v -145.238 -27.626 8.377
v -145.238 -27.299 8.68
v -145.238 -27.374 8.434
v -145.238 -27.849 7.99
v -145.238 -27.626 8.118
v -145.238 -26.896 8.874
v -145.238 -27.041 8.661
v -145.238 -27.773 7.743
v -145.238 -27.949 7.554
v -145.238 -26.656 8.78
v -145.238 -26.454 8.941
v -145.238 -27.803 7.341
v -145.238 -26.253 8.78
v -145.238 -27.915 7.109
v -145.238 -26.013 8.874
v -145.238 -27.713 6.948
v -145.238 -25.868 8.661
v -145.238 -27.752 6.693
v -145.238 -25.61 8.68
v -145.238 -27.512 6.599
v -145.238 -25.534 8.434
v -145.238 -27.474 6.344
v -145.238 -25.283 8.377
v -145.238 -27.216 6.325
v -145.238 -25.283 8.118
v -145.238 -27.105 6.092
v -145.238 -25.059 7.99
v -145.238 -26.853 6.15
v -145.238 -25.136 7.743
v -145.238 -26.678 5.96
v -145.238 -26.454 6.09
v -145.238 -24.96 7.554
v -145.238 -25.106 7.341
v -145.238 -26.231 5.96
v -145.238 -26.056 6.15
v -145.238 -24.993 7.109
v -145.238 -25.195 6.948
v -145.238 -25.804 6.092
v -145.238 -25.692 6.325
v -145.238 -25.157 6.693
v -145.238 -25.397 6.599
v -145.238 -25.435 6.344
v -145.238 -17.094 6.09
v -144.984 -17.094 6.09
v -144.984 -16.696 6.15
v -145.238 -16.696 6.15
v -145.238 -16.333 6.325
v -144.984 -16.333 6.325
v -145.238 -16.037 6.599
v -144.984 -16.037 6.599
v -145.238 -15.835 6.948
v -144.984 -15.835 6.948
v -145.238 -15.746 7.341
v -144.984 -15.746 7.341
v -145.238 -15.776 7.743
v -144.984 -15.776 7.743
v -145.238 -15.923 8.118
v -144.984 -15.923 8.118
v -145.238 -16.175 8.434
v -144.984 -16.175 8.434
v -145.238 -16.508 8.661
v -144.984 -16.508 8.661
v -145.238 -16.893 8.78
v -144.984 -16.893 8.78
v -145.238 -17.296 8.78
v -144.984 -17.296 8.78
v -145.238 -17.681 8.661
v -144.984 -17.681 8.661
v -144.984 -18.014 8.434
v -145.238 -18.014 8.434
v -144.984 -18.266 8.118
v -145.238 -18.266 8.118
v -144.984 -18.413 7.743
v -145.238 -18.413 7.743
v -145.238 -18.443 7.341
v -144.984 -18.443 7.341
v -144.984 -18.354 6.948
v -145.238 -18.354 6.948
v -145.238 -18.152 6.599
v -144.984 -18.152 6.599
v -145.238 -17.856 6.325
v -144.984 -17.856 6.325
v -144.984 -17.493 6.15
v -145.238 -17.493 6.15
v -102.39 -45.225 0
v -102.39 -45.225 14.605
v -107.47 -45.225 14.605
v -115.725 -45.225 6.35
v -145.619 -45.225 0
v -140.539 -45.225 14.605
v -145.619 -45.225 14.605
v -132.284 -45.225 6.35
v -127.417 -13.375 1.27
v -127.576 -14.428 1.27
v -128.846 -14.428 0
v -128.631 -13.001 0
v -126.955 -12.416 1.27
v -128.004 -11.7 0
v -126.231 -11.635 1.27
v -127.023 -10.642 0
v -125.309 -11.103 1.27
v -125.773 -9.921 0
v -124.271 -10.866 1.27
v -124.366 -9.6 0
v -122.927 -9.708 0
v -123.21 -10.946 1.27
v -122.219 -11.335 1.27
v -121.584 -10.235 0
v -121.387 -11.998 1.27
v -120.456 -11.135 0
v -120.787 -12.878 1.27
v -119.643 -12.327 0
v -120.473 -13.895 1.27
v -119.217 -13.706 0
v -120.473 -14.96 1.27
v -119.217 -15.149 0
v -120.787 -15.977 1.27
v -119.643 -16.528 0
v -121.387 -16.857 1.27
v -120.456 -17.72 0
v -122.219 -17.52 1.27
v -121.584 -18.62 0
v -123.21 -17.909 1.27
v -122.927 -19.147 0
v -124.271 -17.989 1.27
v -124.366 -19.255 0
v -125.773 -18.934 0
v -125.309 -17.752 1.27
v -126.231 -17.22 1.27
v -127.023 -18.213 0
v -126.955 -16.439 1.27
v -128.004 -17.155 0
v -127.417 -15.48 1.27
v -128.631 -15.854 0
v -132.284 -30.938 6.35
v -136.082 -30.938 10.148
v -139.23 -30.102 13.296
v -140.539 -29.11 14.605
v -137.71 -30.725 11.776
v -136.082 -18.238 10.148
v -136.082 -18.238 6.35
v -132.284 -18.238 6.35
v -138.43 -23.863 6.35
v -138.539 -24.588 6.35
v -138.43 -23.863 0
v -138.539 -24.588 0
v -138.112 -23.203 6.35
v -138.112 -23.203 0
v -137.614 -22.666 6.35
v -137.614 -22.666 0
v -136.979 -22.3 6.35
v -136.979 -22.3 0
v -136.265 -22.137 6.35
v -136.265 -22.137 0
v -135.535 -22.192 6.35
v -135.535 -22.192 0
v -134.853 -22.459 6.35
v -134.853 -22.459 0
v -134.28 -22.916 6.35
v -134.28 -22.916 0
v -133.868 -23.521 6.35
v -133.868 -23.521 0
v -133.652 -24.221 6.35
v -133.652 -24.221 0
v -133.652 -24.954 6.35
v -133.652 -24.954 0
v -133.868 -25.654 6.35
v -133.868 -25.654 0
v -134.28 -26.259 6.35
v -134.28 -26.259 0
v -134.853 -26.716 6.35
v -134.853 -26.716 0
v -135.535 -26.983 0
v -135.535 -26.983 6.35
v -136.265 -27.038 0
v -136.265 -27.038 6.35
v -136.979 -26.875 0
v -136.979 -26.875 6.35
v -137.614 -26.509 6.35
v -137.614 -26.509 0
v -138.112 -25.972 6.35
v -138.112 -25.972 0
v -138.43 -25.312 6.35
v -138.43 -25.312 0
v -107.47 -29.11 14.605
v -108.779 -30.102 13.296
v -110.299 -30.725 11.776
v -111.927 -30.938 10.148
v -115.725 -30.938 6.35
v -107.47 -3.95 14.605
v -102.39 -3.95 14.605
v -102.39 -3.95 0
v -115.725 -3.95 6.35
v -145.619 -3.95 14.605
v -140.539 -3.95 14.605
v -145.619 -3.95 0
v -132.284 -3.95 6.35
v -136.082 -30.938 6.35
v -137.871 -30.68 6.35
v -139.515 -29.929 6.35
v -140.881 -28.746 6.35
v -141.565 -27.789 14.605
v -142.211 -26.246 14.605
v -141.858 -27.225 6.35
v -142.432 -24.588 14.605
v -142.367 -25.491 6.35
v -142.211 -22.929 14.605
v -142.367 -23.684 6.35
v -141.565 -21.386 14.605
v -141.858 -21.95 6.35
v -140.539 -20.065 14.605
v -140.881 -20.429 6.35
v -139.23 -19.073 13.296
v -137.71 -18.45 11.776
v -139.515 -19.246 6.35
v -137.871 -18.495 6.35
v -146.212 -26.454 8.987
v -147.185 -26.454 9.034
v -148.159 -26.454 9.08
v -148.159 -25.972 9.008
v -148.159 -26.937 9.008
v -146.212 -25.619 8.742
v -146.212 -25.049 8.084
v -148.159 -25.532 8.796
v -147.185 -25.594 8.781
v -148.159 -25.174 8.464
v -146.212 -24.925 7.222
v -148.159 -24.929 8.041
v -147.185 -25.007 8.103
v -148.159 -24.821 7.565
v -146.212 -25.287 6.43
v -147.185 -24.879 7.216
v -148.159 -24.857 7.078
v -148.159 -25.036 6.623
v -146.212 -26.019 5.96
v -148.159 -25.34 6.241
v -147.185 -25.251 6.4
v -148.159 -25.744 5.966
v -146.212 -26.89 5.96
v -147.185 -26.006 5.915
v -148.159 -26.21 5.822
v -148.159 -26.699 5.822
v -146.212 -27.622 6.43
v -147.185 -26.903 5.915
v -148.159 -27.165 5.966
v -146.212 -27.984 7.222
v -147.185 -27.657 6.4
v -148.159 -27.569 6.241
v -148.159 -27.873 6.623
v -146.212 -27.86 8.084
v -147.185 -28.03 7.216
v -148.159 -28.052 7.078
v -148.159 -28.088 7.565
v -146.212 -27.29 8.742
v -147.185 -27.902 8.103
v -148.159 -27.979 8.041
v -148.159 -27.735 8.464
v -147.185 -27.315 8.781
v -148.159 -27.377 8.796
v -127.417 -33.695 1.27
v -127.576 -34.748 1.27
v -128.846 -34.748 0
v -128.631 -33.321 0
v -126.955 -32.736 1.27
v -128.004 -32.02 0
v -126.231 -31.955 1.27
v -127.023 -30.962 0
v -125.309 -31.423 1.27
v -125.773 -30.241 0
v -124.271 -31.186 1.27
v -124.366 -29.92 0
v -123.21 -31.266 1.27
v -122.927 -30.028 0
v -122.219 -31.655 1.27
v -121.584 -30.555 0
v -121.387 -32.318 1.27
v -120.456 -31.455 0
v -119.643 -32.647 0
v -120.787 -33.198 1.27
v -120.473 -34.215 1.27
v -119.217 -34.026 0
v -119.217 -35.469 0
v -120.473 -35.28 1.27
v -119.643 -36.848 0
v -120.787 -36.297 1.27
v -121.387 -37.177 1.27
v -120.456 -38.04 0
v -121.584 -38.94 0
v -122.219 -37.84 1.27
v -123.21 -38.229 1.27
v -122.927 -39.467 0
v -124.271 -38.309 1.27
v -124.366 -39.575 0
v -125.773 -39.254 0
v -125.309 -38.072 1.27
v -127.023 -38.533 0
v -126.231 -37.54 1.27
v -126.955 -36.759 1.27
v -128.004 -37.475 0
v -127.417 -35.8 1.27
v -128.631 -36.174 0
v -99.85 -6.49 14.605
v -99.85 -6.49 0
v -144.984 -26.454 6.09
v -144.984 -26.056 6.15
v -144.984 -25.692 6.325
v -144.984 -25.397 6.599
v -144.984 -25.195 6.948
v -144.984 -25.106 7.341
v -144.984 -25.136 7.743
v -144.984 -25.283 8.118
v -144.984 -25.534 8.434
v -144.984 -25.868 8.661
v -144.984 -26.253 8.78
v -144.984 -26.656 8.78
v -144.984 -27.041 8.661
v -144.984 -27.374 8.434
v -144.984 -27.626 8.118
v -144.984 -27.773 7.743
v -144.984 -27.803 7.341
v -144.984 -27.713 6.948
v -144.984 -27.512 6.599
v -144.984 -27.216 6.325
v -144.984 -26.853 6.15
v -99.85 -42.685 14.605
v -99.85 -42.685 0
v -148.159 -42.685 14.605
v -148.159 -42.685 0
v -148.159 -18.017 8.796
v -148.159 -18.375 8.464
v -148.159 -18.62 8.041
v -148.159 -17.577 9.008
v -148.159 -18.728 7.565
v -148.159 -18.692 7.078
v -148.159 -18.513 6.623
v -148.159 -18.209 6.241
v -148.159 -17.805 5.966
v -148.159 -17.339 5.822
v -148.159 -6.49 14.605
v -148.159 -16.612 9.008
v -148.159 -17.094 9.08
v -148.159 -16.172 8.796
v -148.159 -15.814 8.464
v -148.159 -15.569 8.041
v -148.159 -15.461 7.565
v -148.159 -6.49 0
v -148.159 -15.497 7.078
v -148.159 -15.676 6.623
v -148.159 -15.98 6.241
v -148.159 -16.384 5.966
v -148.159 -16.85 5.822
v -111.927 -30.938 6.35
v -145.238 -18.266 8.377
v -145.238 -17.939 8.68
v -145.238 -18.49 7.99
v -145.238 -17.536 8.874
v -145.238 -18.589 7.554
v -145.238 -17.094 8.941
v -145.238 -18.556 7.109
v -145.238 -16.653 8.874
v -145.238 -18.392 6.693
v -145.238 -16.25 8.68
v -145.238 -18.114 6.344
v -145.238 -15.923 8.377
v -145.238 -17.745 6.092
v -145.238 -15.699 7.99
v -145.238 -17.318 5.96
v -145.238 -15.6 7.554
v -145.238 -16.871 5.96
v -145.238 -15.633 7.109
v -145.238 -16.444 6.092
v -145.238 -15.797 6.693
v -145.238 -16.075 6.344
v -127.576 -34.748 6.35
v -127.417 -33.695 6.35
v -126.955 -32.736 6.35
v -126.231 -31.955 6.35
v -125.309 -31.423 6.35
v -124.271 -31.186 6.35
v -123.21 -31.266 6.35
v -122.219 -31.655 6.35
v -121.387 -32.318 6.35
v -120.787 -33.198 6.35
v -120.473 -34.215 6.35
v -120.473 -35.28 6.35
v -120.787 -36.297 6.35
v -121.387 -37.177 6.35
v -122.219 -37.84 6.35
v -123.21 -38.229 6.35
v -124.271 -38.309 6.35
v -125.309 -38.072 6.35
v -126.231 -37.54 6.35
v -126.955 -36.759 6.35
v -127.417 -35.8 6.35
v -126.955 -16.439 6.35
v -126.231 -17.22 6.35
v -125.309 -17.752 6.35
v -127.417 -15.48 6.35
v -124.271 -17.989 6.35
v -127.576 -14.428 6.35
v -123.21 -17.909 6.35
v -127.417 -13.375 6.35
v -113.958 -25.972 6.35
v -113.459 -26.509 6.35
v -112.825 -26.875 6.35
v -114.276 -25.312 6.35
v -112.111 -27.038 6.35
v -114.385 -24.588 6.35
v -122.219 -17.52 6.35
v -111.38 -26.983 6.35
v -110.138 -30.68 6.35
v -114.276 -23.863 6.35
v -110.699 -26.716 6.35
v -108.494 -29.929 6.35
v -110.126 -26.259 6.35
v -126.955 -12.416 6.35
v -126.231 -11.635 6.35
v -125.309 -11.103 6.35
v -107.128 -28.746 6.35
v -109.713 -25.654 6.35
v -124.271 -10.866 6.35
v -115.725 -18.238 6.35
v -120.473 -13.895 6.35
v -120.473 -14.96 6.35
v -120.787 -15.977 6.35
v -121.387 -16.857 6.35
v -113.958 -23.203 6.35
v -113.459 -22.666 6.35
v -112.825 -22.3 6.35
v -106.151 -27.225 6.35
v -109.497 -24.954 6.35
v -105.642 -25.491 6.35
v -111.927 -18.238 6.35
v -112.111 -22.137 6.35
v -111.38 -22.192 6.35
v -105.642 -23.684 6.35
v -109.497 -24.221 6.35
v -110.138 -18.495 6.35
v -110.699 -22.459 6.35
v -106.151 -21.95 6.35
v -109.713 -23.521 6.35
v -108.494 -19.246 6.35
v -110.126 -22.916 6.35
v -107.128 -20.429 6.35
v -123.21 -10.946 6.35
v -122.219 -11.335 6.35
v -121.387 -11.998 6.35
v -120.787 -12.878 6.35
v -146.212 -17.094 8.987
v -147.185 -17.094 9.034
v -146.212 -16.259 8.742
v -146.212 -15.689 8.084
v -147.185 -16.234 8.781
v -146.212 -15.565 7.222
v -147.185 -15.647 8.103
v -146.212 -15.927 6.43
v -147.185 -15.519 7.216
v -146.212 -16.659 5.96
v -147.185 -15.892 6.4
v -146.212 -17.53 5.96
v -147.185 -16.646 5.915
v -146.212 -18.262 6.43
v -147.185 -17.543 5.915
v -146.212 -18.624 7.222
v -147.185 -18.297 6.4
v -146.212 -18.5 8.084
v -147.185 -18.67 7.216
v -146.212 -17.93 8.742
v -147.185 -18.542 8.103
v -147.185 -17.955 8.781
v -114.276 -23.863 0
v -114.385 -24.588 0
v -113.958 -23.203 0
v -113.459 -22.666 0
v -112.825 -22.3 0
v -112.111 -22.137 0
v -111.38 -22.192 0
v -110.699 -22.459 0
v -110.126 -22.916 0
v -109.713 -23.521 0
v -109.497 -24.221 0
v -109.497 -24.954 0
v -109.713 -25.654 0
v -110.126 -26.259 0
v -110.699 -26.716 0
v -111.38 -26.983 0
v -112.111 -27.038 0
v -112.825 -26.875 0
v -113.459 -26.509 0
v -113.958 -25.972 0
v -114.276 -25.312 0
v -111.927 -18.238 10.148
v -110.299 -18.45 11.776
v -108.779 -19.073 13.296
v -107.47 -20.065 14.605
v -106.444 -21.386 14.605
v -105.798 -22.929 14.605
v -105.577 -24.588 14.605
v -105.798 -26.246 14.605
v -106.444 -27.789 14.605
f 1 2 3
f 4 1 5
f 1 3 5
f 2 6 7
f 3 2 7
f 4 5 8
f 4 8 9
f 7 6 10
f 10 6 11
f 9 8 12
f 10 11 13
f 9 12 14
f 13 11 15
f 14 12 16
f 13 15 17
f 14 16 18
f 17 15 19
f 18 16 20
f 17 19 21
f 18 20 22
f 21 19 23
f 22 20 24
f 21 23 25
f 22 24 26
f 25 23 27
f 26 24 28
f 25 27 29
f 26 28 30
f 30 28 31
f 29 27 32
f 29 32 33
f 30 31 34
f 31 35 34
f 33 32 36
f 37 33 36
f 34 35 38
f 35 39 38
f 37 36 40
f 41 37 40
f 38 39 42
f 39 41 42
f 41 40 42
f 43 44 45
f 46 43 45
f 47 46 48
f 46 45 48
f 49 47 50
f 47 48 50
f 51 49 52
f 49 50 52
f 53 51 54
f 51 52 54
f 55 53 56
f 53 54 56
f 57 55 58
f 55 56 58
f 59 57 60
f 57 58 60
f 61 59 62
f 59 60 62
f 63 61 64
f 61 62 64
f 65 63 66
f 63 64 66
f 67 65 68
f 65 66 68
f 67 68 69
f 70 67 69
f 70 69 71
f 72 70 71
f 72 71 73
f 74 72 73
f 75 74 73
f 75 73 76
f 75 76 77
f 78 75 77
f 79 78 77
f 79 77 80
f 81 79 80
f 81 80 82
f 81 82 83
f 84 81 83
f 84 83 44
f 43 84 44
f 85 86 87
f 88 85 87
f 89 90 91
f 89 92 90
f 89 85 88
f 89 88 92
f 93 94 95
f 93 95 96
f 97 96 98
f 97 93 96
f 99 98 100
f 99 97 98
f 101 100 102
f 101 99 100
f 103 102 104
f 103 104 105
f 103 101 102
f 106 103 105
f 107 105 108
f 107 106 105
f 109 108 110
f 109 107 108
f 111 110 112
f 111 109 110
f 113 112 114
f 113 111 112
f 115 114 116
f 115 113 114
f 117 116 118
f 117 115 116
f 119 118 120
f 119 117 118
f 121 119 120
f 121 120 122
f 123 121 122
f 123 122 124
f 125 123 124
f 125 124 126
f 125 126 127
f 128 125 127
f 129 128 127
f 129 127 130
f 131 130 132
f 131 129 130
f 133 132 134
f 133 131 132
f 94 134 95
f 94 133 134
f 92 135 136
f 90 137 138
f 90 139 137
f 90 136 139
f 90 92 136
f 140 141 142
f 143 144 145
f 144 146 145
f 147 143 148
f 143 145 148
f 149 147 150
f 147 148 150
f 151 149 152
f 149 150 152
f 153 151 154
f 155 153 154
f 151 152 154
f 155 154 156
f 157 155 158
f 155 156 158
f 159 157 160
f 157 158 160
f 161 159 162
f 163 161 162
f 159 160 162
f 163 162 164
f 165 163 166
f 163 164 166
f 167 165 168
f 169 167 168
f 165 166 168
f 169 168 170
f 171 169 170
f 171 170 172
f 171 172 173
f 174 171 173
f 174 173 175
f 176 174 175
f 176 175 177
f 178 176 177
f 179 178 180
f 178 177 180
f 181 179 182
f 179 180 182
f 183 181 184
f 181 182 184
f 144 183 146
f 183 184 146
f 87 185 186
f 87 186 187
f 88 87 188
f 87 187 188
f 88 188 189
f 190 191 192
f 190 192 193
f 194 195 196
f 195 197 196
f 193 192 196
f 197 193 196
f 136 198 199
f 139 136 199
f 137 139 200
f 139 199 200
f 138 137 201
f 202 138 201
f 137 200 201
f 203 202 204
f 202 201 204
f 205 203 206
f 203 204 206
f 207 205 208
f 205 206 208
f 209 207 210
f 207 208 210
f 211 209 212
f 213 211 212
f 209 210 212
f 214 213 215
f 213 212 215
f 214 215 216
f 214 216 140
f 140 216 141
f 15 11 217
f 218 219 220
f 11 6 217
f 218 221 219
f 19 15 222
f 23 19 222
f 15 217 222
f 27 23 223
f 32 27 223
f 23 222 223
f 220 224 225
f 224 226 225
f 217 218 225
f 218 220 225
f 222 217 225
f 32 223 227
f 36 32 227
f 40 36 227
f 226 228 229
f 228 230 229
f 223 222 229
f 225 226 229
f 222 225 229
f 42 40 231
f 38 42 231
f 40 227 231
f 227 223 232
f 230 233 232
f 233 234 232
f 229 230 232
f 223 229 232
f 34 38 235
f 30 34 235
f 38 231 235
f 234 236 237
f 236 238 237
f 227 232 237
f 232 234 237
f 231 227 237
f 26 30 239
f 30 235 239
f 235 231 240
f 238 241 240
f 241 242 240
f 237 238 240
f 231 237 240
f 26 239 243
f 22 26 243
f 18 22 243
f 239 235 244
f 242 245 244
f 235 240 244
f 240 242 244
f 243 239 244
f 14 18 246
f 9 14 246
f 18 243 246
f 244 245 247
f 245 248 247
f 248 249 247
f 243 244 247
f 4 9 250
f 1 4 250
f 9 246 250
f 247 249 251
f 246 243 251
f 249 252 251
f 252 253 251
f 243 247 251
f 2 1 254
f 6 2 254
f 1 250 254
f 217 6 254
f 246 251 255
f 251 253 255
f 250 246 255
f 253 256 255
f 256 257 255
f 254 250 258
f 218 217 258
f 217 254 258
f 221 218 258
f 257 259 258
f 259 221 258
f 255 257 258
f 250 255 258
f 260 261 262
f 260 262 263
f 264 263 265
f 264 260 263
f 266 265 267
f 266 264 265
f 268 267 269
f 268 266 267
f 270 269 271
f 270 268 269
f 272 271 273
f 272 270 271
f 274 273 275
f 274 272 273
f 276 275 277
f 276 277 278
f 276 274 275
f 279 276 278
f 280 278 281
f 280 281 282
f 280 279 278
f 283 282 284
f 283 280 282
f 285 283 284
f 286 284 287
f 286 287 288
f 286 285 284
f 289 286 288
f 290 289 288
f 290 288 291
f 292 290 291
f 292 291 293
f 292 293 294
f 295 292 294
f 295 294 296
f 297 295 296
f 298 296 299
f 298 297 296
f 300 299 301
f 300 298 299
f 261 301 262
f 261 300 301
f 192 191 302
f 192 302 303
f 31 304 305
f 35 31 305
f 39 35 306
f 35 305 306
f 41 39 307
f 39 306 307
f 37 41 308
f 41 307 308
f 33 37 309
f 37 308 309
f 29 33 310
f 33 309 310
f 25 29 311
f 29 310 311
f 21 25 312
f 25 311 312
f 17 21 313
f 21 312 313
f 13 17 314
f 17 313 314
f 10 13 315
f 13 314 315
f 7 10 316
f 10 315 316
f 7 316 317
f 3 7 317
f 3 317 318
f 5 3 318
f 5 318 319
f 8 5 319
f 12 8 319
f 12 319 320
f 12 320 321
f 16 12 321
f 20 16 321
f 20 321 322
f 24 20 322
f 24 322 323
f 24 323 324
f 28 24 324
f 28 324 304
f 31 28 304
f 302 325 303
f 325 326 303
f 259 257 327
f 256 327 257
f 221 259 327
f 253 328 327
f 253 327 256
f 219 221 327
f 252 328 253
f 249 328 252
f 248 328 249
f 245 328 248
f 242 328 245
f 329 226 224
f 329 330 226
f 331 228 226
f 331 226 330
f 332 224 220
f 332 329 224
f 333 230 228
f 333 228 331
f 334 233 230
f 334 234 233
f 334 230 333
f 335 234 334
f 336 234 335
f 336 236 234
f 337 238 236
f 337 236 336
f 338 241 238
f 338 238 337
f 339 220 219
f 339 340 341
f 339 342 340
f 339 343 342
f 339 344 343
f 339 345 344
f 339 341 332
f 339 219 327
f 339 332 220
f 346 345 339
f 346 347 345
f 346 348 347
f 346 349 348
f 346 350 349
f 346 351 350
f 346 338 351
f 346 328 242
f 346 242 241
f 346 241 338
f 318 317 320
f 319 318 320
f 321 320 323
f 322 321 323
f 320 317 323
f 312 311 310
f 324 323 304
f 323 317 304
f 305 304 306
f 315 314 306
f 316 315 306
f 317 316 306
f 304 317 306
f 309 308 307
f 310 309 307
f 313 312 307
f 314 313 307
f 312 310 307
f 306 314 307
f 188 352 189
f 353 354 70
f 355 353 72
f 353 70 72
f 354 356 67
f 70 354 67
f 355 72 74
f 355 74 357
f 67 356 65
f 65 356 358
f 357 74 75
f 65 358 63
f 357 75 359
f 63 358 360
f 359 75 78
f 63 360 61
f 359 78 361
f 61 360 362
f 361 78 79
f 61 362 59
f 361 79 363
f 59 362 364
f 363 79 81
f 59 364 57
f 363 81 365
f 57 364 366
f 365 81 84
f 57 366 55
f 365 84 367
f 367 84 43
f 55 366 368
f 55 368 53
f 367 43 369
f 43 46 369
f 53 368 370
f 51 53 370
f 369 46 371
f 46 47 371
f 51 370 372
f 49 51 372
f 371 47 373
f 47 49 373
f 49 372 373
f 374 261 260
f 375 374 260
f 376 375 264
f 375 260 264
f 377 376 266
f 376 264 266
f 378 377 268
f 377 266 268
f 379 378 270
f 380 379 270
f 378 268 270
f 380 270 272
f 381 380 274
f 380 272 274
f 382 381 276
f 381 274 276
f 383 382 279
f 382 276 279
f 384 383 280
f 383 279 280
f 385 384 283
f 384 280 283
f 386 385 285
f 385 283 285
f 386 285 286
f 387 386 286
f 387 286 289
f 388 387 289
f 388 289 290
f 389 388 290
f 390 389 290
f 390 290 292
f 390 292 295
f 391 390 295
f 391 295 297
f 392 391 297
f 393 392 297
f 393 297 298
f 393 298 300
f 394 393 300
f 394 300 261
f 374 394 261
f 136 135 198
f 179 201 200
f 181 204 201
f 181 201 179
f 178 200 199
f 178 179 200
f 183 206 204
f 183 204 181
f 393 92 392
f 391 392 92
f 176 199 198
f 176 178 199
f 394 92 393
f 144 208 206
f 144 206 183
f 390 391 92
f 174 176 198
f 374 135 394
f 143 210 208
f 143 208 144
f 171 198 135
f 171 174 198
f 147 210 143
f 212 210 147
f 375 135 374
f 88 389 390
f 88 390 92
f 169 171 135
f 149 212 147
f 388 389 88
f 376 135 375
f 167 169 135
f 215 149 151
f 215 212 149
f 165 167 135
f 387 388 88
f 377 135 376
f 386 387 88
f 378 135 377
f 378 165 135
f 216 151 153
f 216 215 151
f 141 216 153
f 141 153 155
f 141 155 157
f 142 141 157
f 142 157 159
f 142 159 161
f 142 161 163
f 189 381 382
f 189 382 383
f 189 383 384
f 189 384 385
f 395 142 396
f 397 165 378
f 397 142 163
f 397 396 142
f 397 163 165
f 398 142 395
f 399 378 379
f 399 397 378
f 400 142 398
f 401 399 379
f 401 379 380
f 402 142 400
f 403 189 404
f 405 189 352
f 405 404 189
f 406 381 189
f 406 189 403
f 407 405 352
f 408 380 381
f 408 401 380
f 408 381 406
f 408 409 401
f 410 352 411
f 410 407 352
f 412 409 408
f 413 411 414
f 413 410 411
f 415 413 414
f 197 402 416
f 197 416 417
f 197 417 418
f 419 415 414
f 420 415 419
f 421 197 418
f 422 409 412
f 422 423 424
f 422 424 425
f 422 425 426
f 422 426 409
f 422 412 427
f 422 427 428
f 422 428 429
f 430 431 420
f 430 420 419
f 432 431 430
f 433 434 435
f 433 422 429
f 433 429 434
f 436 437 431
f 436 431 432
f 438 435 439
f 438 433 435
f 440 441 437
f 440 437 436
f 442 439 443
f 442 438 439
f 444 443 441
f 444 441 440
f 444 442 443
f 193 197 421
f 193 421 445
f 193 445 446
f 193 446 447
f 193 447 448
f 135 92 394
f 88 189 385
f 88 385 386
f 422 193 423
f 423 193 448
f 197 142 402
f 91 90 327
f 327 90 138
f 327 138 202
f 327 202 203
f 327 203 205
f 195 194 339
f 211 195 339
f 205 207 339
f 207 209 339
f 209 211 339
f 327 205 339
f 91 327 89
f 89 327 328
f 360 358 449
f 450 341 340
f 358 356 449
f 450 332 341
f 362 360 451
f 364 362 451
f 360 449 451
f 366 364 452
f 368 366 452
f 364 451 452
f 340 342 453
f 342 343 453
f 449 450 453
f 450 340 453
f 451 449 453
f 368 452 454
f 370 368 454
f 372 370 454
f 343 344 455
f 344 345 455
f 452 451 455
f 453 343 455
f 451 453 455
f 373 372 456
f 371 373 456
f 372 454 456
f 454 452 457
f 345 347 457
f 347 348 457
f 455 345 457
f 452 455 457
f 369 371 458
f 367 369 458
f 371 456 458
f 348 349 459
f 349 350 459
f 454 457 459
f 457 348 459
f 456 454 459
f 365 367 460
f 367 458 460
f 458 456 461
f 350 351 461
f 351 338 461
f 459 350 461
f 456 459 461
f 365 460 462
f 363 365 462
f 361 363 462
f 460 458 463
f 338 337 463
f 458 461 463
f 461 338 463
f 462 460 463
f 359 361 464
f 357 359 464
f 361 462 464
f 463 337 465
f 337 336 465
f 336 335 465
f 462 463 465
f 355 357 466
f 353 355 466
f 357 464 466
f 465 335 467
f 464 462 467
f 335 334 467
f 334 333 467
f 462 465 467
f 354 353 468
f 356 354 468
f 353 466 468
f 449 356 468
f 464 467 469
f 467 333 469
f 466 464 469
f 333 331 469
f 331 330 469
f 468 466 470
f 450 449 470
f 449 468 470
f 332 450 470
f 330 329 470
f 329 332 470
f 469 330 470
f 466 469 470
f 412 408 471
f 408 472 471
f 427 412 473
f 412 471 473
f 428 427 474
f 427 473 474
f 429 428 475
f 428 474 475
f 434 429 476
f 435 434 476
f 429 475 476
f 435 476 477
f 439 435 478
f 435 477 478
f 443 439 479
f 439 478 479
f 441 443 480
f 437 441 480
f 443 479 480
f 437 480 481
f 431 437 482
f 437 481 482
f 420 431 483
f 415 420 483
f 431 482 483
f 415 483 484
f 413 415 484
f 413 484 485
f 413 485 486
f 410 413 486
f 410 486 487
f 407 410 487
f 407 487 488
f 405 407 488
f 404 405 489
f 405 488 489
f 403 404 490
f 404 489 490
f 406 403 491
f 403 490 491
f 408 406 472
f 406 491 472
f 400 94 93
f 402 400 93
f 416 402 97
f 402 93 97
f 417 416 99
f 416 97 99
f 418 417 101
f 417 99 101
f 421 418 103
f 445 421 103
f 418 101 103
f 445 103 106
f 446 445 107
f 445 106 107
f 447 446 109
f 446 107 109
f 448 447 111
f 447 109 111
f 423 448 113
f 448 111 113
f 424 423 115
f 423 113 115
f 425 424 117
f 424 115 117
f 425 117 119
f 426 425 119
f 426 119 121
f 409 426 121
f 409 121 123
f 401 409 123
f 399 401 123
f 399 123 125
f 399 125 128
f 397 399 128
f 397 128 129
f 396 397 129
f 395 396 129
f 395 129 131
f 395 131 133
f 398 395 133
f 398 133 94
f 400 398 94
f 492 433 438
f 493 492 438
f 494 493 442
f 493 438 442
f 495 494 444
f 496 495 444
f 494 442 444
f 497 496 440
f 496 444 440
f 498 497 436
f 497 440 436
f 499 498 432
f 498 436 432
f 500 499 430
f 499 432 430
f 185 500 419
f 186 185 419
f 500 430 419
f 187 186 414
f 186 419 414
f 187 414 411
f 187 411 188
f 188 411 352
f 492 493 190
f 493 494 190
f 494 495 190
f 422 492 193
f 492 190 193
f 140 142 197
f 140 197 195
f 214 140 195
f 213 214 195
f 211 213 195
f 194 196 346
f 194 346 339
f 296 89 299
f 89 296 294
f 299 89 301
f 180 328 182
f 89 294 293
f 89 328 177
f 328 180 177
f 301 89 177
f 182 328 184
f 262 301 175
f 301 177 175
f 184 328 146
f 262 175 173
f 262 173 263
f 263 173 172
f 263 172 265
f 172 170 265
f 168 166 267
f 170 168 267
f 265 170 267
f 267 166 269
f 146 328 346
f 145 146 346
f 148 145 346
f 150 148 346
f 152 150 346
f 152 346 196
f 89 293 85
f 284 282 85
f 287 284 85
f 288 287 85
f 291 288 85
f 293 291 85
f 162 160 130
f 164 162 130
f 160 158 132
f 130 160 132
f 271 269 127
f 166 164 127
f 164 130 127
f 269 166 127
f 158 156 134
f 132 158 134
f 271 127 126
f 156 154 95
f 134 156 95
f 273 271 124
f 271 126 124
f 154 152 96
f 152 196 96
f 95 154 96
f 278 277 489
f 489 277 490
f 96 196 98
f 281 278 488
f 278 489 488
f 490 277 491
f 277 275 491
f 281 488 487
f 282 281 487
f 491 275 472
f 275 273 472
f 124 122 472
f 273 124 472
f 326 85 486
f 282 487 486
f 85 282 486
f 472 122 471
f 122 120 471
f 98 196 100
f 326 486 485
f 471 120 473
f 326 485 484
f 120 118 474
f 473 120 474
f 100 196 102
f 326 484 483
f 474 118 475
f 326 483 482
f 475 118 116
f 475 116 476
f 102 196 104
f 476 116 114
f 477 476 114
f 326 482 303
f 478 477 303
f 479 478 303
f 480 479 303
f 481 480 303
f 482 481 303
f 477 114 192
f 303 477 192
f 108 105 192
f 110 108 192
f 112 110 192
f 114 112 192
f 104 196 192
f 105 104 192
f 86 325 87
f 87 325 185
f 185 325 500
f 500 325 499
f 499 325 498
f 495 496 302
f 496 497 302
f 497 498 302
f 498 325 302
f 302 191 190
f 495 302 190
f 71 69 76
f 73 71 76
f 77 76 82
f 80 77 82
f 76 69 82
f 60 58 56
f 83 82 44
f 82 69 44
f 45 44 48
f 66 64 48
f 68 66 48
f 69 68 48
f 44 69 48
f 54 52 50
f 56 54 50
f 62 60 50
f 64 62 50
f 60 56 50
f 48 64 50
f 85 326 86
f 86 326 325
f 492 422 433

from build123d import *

# Parameters (mm, degrees)
SKETCH1_W                 = 48.308864232
SKETCH1_H                 = 41.275
BOSS_EXTRUDE1_DEPTH       = 6.35
F_8_CLEARANCE_HOLE1_D     = 4.9149
F_1_4_CLEARANCE_HOLE1_D   = 7.14248
SKETCH9_W                 = 6.35
SKETCH9_H                 = 41.275
EXTRUDE_THIN1_DEPTH       = 8.255
CHAMFER2_SIZE             = 9.525
CUT_EXTRUDE1_DEPTH        = 156.127382276
CHAMFER1_SIZE             = 2.54
HOLE1_AT_2_COUNT          = 2
HOLE1_AT_2_PITCH          = 9.3599
F_2_CLEARANCE_HOLE1_D     = 2.7051
F_2_CLEARANCE_HOLE1_DEPTH = 3.175
CHAMFER3_SIZE             = 1.27


with BuildPart() as part:
    # Sketch1 → Boss-Extrude1 (new body)
    with BuildSketch(Plane.XY):
        with Locations((-124.004465969, -24.5875)):
            Rectangle(SKETCH1_W, SKETCH1_H)
    extrude(amount=BOSS_EXTRUDE1_DEPTH)

    # #8 Clearance Hole1 (through all)
    with Locations(Plane.XY.offset(6.35)):
        with Locations((-111.927249911, -24.5875), (-136.081682027, -24.5875)):
            Hole(F_8_CLEARANCE_HOLE1_D / 2)

    # 1/4 Clearance Hole1 (through all)
    with Locations(Plane.XY.offset(6.35)):
        with Locations((-124.004465969, -14.4275), (-124.004465969, -34.7475)):
            Hole(F_1_4_CLEARANCE_HOLE1_D / 2)

    # Sketch9 → Extrude-Thin1 (add)
    with BuildSketch(Plane.XY.offset(6.35)):
        with Locations((-103.025033853, -24.5875)):
            Rectangle(SKETCH9_W, SKETCH9_H)
        with Locations((-144.983898085, -24.5875)):
            Rectangle(SKETCH9_W, SKETCH9_H)
    extrude(amount=EXTRUDE_THIN1_DEPTH)

    # Chamfer2
    # the kernel refuses this chamfer: 9.525 mm, written as the material it adds along each edge
    with BuildSketch(Plane(origin=(-106.200033853, -3.95, 6.35), x_dir=(0.0274958766105871, 0, 0.9996219169112966), z_dir=(0, -1, 0))) as chamfer2_piece_1_section:
        Polygon((CHAMFER2_SIZE * 0.999621916911, CHAMFER2_SIZE * 0.0274958766106), (-CHAMFER2_SIZE * 0.0274958766106, CHAMFER2_SIZE * 0.999621916911), (0, 0), align=None)
    chamfer2_piece_1 = extrude(amount=41.275, mode=Mode.PRIVATE)
    chamfer2_piece_1 = chamfer2_piece_1 - Plane(origin=(-111.927249911, -24.5875, 9.368765613), x_dir=(-1, 0, 0), z_dir=(0, 0, -1)) * Cylinder(2.45745, 121, mode=Mode.PRIVATE)
    chamfer2_piece_1 = split(chamfer2_piece_1, bisect_by=Plane(origin=(-109.341812124, -24.58749874, 14.605), z_dir=(0, 0, -1)), keep=Keep.TOP, mode=Mode.PRIVATE)
    add(chamfer2_piece_1)
    with BuildSketch(Plane(origin=(-141.808898085, -45.225, 6.35), x_dir=(0.9996219169112968, 0, -0.027495876610586386), z_dir=(0, 1, 0))) as chamfer2_piece_2_section:
        Polygon((CHAMFER2_SIZE * 0.999621916911, -CHAMFER2_SIZE * 0.0274958766106), (-CHAMFER2_SIZE * 0.0274958766106, -CHAMFER2_SIZE * 0.999621916911), (0, 0), align=None)
    chamfer2_piece_2 = extrude(amount=41.275, mode=Mode.PRIVATE)
    chamfer2_piece_2 = chamfer2_piece_2 - Plane(origin=(-136.081682027, -24.5875, 9.368765819), x_dir=(-1, 0, 0), z_dir=(0, 0, -1)) * Cylinder(2.45745, 121, mode=Mode.PRIVATE)
    chamfer2_piece_2 = split(chamfer2_piece_2, bisect_by=Plane(origin=(-138.667118685, -24.587501904, 14.605), z_dir=(0, 0, -1)), keep=Keep.TOP, mode=Mode.PRIVATE)
    add(chamfer2_piece_2)

    # Sketch10 → Cut-Extrude1 (cut, through all)
    with BuildSketch(Plane.XY.offset(6.35)):
        with BuildLine():
            Line((-136.081682027, -18.2375), (-111.927249911, -18.2375))
            ThreePointArc((-111.927249911, -18.2375), (-105.577249911, -24.5875), (-111.927249911, -30.9375))
            Line((-111.927249911, -30.9375), (-136.081682027, -30.9375))
            ThreePointArc((-136.081682027, -30.9375), (-142.431682027, -24.5875), (-136.081682027, -18.2375))
        make_face()
    extrude(amount=CUT_EXTRUDE1_DEPTH, mode=Mode.SUBTRACT)

    # Chamfer1
    chamfer1_edges = [part.edges().sort_by_distance(p)[0] for p in [
        (-99.850033853, -45.225, 7.3025),
        (-148.158898085, -45.225, 7.3025),
        (-148.158898085, -3.95, 7.3025),
        (-99.850033853, -3.95, 7.3025),
    ]]
    chamfer(chamfer1_edges, length=CHAMFER1_SIZE)

    # Sketch12 → Hole1 (revolve, cut)
    with BuildSketch(Plane(origin=(-148.158898085, -26.4544, 7.4422), x_dir=(0, 0, 1), z_dir=(0, 1, 0))):
        Polygon((0, 0), (0, 2.921), (1.4986, 2.921), (1.6383, 0), align=None)
    hole1 = revolve(axis=Axis((-38.158898085, -26.4544, 7.4422), (-1, 0, 0)), mode=Mode.SUBTRACT)

    # Hole1 at 2: Hole1 ×2
    with Locations(*[(0, i * HOLE1_AT_2_PITCH, 0) for i in range(1, HOLE1_AT_2_COUNT)]):
        add(hole1, mode=Mode.SUBTRACT)

    # #2 Clearance Hole1
    with Locations(Plane.ZY.offset(148.158898085)):
        with Locations((7.4422, -17.0945), (7.4422, -26.4544)):
            Hole(F_2_CLEARANCE_HOLE1_D / 2, depth=F_2_CLEARANCE_HOLE1_DEPTH)

    # Chamfer3
    chamfer3_edges = [part.edges().sort_by_distance(p)[0] for p in [
        (-120.433225969, -34.7475, 0),
        (-120.433225969, -14.4275, 0),
    ]]
    chamfer(chamfer3_edges, length=CHAMFER3_SIZE)


solid = part.part
